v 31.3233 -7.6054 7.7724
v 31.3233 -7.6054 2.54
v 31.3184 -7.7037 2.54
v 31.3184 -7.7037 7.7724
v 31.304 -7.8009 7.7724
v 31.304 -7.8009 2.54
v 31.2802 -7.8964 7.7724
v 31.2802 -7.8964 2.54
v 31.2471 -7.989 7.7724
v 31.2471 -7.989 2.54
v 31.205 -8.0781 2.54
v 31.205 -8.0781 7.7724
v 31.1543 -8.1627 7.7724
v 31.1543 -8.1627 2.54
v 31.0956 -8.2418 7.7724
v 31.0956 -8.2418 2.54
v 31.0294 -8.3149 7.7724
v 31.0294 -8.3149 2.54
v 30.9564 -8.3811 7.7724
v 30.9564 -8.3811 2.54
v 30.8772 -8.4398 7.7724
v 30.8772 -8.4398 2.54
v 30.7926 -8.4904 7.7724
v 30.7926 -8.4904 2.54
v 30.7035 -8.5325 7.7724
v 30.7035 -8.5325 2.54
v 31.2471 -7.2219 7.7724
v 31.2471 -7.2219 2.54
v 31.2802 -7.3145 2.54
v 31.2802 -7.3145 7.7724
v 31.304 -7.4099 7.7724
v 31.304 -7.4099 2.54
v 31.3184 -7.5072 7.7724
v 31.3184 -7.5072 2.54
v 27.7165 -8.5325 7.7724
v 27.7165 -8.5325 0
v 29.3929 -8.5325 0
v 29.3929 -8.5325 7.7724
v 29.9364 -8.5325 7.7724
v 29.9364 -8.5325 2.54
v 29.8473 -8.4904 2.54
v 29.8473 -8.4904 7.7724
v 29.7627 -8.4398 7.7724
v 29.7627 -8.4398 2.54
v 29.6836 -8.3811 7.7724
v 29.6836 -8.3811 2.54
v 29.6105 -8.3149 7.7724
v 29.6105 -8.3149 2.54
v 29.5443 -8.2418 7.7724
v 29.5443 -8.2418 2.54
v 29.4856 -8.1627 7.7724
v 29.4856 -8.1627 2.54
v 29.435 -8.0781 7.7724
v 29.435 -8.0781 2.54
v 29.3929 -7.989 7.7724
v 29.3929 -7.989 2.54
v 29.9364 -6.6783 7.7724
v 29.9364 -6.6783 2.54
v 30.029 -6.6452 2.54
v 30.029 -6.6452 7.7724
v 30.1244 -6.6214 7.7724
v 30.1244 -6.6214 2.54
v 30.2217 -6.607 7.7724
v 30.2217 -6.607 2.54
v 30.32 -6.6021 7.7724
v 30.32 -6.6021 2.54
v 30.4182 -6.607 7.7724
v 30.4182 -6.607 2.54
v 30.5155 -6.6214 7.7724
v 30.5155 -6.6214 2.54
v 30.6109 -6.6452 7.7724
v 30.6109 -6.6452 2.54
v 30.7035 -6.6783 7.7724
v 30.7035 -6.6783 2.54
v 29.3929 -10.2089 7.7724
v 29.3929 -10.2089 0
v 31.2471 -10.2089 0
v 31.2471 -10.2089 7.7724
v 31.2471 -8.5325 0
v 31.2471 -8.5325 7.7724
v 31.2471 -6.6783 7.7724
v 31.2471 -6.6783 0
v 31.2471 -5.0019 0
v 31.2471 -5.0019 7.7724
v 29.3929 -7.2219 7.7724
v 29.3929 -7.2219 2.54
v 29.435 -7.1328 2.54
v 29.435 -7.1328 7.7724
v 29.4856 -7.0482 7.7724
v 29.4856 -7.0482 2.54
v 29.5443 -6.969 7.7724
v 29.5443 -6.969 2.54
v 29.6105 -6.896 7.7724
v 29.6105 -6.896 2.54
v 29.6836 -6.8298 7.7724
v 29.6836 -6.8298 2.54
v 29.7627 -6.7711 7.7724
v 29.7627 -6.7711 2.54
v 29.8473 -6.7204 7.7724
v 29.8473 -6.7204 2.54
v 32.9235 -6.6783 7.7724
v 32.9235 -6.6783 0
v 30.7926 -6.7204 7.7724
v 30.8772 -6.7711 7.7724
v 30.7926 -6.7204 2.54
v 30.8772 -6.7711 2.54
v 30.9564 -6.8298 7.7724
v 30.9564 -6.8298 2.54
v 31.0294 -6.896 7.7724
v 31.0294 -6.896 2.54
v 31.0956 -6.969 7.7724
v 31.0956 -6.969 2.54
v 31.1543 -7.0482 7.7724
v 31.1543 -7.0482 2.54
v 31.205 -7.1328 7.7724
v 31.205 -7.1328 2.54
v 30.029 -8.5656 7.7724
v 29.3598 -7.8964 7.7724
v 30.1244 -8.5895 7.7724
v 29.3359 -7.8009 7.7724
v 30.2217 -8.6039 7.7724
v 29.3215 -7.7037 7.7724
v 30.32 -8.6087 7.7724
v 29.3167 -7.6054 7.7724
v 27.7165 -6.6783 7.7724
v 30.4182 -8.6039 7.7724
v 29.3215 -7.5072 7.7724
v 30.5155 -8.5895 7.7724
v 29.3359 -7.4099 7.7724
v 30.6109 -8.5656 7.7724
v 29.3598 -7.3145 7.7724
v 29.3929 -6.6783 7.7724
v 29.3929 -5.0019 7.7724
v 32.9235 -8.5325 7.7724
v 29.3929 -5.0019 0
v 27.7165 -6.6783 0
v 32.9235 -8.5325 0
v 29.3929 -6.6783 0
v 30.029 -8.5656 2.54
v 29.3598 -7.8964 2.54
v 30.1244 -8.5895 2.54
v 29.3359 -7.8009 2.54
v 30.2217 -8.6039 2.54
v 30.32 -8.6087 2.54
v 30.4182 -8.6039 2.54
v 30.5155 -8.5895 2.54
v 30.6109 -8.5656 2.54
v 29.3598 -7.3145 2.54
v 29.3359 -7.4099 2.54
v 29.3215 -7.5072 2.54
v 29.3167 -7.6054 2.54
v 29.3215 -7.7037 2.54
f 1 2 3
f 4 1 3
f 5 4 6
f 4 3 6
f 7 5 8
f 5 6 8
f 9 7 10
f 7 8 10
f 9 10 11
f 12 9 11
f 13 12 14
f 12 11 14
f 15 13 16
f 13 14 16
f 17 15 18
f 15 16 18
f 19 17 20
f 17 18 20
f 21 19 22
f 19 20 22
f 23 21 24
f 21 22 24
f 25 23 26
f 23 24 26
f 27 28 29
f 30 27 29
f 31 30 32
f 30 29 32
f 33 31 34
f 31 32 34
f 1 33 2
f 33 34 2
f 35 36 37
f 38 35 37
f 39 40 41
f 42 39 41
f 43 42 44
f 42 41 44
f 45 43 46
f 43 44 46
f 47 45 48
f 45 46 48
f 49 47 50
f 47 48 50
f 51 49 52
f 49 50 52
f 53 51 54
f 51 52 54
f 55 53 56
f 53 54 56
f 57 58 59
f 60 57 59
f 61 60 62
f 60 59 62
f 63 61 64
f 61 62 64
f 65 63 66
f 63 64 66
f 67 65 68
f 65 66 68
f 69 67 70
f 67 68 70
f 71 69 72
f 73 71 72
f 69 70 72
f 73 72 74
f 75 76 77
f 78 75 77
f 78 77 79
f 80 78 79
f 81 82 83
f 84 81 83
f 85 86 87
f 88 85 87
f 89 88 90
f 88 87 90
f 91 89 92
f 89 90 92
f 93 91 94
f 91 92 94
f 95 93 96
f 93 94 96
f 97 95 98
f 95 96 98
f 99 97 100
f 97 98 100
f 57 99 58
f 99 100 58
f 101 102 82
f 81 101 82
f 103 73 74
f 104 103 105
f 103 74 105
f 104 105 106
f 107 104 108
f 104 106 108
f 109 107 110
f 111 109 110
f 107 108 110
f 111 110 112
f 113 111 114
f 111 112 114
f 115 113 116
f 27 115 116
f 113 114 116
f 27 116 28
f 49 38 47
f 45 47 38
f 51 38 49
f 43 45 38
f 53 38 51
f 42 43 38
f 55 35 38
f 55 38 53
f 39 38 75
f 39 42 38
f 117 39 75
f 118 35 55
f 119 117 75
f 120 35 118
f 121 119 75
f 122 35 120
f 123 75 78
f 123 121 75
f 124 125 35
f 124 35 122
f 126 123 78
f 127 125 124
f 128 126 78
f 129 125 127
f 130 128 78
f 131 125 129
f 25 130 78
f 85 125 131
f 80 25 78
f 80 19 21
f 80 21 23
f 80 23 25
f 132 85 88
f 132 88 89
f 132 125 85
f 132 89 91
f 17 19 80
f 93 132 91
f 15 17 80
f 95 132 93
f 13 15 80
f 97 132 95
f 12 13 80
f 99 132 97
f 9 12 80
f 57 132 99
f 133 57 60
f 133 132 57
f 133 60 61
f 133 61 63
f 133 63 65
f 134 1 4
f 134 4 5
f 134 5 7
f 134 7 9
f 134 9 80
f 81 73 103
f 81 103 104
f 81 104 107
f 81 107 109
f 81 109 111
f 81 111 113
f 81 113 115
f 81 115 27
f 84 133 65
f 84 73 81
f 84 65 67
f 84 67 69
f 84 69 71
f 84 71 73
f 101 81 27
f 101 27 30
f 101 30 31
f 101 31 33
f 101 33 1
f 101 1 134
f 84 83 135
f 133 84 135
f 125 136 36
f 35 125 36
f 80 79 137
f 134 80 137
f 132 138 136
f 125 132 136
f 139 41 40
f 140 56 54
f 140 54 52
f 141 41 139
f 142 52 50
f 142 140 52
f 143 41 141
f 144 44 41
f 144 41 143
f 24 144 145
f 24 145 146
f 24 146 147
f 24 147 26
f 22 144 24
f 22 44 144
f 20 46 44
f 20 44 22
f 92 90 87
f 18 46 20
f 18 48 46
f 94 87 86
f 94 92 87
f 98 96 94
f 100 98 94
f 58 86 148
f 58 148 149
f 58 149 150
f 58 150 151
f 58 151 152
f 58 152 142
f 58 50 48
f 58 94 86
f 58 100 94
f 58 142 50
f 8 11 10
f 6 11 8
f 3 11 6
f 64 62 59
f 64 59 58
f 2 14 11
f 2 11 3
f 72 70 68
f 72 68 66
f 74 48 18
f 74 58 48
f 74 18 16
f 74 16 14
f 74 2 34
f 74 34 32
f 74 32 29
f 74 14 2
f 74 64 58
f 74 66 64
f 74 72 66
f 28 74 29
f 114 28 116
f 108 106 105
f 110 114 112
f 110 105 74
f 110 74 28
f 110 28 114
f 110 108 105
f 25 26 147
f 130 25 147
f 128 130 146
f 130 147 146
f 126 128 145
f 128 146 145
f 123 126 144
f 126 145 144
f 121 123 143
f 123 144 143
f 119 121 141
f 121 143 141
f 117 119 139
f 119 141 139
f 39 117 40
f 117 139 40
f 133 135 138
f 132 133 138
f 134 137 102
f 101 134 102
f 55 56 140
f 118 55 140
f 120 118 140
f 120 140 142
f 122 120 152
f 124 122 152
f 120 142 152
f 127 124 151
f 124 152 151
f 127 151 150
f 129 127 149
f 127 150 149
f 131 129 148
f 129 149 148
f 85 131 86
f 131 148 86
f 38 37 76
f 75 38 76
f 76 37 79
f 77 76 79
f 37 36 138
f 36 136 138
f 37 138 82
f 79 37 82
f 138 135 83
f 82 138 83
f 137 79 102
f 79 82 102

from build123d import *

# Parameters (mm, degrees)
F1_DEPTH = 7.7724
F2_DEPTH = 2.54


with BuildPart() as f1:
    # F0 (on Top) → F1 (new body)
    with BuildSketch(Plane.XY):
        with BuildLine():
            Line((29.3928639389, -5.0019352848), (29.3928639389, -6.6783352848))
            Line((29.3928639389, -6.6783352848), (29.9364323496, -6.6783352848))
            ThreePointArc((29.9364323496, -6.6783352848), (30.3199639389, -6.6021352848), (30.7034955282, -6.6783352848))
            Line((30.7034955282, -6.6783352848), (31.2470639389, -6.6783352848))
            Line((31.2470639389, -6.6783352848), (31.2470639389, -5.0019352848))
            Line((31.2470639389, -5.0019352848), (29.3928639389, -5.0019352848))
        make_face()
        with BuildLine():
            Line((29.9364323496, -6.6783352848), (29.3928639389, -6.6783352848))
            Line((29.3928639389, -6.6783352848), (29.3928639389, -7.2219036954))
            ThreePointArc((29.3928639389, -7.2219036954), (29.6105237053, -6.8959950512), (29.9364323496, -6.6783352848))
        make_face()
        with BuildLine():
            Line((29.3928639389, -6.6783352848), (27.7164639389, -6.6783352848))
            Line((27.7164639389, -6.6783352848), (27.7164639389, -8.5325352848))
            Line((27.7164639389, -8.5325352848), (29.3928639389, -8.5325352848))
            Line((29.3928639389, -8.5325352848), (29.3928639389, -7.9889668741))
            ThreePointArc((29.3928639389, -7.9889668741), (29.3166639389, -7.6054352848), (29.3928639389, -7.2219036954))
            Line((29.3928639389, -7.2219036954), (29.3928639389, -6.6783352848))
        make_face()
        with BuildLine():
            Line((29.9364323496, -8.5325352848), (29.3928639389, -8.5325352848))
            Line((29.3928639389, -8.5325352848), (29.3928639389, -10.2089352848))
            Line((29.3928639389, -10.2089352848), (31.2470639389, -10.2089352848))
            Line((31.2470639389, -10.2089352848), (31.2470639389, -8.5325352848))
            Line((31.2470639389, -8.5325352848), (30.7034955282, -8.5325352848))
            ThreePointArc((30.7034955282, -8.5325352848), (30.3199639389, -8.6087352848), (29.9364323496, -8.5325352848))
        make_face()
        with BuildLine():
            Line((32.9234639389, -6.6783352848), (31.2470639389, -6.6783352848))
            Line((31.2470639389, -6.6783352848), (31.2470639389, -7.2219036954))
            ThreePointArc((31.2470639389, -7.2219036954), (31.3040295668, -7.4099212699), (31.3232639389, -7.6054352848))
            ThreePointArc((31.3232639389, -7.6054352848), (31.3040295668, -7.8009492996), (31.2470639389, -7.9889668741))
            Line((31.2470639389, -7.9889668741), (31.2470639389, -8.5325352848))
            Line((31.2470639389, -8.5325352848), (32.9234639389, -8.5325352848))
            Line((32.9234639389, -8.5325352848), (32.9234639389, -6.6783352848))
        make_face()
        with BuildLine():
            Line((31.2470639389, -6.6783352848), (30.7034955282, -6.6783352848))
            ThreePointArc((30.7034955282, -6.6783352848), (31.0294041725, -6.8959950512), (31.2470639389, -7.2219036954))
            Line((31.2470639389, -7.2219036954), (31.2470639389, -6.6783352848))
        make_face()
        with BuildLine():
            ThreePointArc((31.2470639389, -7.9889668741), (31.0294041725, -8.3148755183), (30.7034955282, -8.5325352848))
            Line((30.7034955282, -8.5325352848), (31.2470639389, -8.5325352848))
            Line((31.2470639389, -8.5325352848), (31.2470639389, -7.9889668741))
        make_face()
        with BuildLine():
            Line((29.3928639389, -7.9889668741), (29.3928639389, -8.5325352848))
            Line((29.3928639389, -8.5325352848), (29.9364323496, -8.5325352848))
            ThreePointArc((29.9364323496, -8.5325352848), (29.6105237053, -8.3148755183), (29.3928639389, -7.9889668741))
        make_face()
    extrude(amount=F1_DEPTH)

    # F0 (on Top) → F2 (join)
    with BuildSketch(Plane.XY):
        with BuildLine():
            Line((30.7034955282, -6.6783352848), (29.9364323496, -6.6783352848))
            ThreePointArc((29.9364323496, -6.6783352848), (29.6105237053, -6.8959950512), (29.3928639389, -7.2219036954))
            Line((29.3928639389, -7.2219036954), (29.3928639389, -7.9889668741))
            ThreePointArc((29.3928639389, -7.9889668741), (29.6105237053, -8.3148755183), (29.9364323496, -8.5325352848))
            Line((29.9364323496, -8.5325352848), (30.7034955282, -8.5325352848))
            ThreePointArc((30.7034955282, -8.5325352848), (31.0294041725, -8.3148755183), (31.2470639389, -7.9889668741))
            Line((31.2470639389, -7.9889668741), (31.2470639389, -7.2219036954))
            ThreePointArc((31.2470639389, -7.2219036954), (31.0294041725, -6.8959950512), (30.7034955282, -6.6783352848))
        make_face()
        with BuildLine():
            Line((29.3928639389, -7.9889668741), (29.3928639389, -7.2219036954))
            ThreePointArc((29.3928639389, -7.2219036954), (29.3166639389, -7.6054352848), (29.3928639389, -7.9889668741))
        make_face()
        with BuildLine():
            Line((30.7034955282, -8.5325352848), (29.9364323496, -8.5325352848))
            ThreePointArc((29.9364323496, -8.5325352848), (30.3199639389, -8.6087352848), (30.7034955282, -8.5325352848))
        make_face()
        with BuildLine():
            ThreePointArc((31.3232639389, -7.6054352848), (31.3040295668, -7.4099212699), (31.2470639389, -7.2219036954))
            Line((31.2470639389, -7.2219036954), (31.2470639389, -7.9889668741))
            ThreePointArc((31.2470639389, -7.9889668741), (31.3040295668, -7.8009492996), (31.3232639389, -7.6054352848))
        make_face()
        with BuildLine():
            ThreePointArc((30.7034955282, -6.6783352848), (30.3199639389, -6.6021352848), (29.9364323496, -6.6783352848))
            Line((29.9364323496, -6.6783352848), (30.7034955282, -6.6783352848))
        make_face()
    extrude(amount=F2_DEPTH)


solid = f1.part
